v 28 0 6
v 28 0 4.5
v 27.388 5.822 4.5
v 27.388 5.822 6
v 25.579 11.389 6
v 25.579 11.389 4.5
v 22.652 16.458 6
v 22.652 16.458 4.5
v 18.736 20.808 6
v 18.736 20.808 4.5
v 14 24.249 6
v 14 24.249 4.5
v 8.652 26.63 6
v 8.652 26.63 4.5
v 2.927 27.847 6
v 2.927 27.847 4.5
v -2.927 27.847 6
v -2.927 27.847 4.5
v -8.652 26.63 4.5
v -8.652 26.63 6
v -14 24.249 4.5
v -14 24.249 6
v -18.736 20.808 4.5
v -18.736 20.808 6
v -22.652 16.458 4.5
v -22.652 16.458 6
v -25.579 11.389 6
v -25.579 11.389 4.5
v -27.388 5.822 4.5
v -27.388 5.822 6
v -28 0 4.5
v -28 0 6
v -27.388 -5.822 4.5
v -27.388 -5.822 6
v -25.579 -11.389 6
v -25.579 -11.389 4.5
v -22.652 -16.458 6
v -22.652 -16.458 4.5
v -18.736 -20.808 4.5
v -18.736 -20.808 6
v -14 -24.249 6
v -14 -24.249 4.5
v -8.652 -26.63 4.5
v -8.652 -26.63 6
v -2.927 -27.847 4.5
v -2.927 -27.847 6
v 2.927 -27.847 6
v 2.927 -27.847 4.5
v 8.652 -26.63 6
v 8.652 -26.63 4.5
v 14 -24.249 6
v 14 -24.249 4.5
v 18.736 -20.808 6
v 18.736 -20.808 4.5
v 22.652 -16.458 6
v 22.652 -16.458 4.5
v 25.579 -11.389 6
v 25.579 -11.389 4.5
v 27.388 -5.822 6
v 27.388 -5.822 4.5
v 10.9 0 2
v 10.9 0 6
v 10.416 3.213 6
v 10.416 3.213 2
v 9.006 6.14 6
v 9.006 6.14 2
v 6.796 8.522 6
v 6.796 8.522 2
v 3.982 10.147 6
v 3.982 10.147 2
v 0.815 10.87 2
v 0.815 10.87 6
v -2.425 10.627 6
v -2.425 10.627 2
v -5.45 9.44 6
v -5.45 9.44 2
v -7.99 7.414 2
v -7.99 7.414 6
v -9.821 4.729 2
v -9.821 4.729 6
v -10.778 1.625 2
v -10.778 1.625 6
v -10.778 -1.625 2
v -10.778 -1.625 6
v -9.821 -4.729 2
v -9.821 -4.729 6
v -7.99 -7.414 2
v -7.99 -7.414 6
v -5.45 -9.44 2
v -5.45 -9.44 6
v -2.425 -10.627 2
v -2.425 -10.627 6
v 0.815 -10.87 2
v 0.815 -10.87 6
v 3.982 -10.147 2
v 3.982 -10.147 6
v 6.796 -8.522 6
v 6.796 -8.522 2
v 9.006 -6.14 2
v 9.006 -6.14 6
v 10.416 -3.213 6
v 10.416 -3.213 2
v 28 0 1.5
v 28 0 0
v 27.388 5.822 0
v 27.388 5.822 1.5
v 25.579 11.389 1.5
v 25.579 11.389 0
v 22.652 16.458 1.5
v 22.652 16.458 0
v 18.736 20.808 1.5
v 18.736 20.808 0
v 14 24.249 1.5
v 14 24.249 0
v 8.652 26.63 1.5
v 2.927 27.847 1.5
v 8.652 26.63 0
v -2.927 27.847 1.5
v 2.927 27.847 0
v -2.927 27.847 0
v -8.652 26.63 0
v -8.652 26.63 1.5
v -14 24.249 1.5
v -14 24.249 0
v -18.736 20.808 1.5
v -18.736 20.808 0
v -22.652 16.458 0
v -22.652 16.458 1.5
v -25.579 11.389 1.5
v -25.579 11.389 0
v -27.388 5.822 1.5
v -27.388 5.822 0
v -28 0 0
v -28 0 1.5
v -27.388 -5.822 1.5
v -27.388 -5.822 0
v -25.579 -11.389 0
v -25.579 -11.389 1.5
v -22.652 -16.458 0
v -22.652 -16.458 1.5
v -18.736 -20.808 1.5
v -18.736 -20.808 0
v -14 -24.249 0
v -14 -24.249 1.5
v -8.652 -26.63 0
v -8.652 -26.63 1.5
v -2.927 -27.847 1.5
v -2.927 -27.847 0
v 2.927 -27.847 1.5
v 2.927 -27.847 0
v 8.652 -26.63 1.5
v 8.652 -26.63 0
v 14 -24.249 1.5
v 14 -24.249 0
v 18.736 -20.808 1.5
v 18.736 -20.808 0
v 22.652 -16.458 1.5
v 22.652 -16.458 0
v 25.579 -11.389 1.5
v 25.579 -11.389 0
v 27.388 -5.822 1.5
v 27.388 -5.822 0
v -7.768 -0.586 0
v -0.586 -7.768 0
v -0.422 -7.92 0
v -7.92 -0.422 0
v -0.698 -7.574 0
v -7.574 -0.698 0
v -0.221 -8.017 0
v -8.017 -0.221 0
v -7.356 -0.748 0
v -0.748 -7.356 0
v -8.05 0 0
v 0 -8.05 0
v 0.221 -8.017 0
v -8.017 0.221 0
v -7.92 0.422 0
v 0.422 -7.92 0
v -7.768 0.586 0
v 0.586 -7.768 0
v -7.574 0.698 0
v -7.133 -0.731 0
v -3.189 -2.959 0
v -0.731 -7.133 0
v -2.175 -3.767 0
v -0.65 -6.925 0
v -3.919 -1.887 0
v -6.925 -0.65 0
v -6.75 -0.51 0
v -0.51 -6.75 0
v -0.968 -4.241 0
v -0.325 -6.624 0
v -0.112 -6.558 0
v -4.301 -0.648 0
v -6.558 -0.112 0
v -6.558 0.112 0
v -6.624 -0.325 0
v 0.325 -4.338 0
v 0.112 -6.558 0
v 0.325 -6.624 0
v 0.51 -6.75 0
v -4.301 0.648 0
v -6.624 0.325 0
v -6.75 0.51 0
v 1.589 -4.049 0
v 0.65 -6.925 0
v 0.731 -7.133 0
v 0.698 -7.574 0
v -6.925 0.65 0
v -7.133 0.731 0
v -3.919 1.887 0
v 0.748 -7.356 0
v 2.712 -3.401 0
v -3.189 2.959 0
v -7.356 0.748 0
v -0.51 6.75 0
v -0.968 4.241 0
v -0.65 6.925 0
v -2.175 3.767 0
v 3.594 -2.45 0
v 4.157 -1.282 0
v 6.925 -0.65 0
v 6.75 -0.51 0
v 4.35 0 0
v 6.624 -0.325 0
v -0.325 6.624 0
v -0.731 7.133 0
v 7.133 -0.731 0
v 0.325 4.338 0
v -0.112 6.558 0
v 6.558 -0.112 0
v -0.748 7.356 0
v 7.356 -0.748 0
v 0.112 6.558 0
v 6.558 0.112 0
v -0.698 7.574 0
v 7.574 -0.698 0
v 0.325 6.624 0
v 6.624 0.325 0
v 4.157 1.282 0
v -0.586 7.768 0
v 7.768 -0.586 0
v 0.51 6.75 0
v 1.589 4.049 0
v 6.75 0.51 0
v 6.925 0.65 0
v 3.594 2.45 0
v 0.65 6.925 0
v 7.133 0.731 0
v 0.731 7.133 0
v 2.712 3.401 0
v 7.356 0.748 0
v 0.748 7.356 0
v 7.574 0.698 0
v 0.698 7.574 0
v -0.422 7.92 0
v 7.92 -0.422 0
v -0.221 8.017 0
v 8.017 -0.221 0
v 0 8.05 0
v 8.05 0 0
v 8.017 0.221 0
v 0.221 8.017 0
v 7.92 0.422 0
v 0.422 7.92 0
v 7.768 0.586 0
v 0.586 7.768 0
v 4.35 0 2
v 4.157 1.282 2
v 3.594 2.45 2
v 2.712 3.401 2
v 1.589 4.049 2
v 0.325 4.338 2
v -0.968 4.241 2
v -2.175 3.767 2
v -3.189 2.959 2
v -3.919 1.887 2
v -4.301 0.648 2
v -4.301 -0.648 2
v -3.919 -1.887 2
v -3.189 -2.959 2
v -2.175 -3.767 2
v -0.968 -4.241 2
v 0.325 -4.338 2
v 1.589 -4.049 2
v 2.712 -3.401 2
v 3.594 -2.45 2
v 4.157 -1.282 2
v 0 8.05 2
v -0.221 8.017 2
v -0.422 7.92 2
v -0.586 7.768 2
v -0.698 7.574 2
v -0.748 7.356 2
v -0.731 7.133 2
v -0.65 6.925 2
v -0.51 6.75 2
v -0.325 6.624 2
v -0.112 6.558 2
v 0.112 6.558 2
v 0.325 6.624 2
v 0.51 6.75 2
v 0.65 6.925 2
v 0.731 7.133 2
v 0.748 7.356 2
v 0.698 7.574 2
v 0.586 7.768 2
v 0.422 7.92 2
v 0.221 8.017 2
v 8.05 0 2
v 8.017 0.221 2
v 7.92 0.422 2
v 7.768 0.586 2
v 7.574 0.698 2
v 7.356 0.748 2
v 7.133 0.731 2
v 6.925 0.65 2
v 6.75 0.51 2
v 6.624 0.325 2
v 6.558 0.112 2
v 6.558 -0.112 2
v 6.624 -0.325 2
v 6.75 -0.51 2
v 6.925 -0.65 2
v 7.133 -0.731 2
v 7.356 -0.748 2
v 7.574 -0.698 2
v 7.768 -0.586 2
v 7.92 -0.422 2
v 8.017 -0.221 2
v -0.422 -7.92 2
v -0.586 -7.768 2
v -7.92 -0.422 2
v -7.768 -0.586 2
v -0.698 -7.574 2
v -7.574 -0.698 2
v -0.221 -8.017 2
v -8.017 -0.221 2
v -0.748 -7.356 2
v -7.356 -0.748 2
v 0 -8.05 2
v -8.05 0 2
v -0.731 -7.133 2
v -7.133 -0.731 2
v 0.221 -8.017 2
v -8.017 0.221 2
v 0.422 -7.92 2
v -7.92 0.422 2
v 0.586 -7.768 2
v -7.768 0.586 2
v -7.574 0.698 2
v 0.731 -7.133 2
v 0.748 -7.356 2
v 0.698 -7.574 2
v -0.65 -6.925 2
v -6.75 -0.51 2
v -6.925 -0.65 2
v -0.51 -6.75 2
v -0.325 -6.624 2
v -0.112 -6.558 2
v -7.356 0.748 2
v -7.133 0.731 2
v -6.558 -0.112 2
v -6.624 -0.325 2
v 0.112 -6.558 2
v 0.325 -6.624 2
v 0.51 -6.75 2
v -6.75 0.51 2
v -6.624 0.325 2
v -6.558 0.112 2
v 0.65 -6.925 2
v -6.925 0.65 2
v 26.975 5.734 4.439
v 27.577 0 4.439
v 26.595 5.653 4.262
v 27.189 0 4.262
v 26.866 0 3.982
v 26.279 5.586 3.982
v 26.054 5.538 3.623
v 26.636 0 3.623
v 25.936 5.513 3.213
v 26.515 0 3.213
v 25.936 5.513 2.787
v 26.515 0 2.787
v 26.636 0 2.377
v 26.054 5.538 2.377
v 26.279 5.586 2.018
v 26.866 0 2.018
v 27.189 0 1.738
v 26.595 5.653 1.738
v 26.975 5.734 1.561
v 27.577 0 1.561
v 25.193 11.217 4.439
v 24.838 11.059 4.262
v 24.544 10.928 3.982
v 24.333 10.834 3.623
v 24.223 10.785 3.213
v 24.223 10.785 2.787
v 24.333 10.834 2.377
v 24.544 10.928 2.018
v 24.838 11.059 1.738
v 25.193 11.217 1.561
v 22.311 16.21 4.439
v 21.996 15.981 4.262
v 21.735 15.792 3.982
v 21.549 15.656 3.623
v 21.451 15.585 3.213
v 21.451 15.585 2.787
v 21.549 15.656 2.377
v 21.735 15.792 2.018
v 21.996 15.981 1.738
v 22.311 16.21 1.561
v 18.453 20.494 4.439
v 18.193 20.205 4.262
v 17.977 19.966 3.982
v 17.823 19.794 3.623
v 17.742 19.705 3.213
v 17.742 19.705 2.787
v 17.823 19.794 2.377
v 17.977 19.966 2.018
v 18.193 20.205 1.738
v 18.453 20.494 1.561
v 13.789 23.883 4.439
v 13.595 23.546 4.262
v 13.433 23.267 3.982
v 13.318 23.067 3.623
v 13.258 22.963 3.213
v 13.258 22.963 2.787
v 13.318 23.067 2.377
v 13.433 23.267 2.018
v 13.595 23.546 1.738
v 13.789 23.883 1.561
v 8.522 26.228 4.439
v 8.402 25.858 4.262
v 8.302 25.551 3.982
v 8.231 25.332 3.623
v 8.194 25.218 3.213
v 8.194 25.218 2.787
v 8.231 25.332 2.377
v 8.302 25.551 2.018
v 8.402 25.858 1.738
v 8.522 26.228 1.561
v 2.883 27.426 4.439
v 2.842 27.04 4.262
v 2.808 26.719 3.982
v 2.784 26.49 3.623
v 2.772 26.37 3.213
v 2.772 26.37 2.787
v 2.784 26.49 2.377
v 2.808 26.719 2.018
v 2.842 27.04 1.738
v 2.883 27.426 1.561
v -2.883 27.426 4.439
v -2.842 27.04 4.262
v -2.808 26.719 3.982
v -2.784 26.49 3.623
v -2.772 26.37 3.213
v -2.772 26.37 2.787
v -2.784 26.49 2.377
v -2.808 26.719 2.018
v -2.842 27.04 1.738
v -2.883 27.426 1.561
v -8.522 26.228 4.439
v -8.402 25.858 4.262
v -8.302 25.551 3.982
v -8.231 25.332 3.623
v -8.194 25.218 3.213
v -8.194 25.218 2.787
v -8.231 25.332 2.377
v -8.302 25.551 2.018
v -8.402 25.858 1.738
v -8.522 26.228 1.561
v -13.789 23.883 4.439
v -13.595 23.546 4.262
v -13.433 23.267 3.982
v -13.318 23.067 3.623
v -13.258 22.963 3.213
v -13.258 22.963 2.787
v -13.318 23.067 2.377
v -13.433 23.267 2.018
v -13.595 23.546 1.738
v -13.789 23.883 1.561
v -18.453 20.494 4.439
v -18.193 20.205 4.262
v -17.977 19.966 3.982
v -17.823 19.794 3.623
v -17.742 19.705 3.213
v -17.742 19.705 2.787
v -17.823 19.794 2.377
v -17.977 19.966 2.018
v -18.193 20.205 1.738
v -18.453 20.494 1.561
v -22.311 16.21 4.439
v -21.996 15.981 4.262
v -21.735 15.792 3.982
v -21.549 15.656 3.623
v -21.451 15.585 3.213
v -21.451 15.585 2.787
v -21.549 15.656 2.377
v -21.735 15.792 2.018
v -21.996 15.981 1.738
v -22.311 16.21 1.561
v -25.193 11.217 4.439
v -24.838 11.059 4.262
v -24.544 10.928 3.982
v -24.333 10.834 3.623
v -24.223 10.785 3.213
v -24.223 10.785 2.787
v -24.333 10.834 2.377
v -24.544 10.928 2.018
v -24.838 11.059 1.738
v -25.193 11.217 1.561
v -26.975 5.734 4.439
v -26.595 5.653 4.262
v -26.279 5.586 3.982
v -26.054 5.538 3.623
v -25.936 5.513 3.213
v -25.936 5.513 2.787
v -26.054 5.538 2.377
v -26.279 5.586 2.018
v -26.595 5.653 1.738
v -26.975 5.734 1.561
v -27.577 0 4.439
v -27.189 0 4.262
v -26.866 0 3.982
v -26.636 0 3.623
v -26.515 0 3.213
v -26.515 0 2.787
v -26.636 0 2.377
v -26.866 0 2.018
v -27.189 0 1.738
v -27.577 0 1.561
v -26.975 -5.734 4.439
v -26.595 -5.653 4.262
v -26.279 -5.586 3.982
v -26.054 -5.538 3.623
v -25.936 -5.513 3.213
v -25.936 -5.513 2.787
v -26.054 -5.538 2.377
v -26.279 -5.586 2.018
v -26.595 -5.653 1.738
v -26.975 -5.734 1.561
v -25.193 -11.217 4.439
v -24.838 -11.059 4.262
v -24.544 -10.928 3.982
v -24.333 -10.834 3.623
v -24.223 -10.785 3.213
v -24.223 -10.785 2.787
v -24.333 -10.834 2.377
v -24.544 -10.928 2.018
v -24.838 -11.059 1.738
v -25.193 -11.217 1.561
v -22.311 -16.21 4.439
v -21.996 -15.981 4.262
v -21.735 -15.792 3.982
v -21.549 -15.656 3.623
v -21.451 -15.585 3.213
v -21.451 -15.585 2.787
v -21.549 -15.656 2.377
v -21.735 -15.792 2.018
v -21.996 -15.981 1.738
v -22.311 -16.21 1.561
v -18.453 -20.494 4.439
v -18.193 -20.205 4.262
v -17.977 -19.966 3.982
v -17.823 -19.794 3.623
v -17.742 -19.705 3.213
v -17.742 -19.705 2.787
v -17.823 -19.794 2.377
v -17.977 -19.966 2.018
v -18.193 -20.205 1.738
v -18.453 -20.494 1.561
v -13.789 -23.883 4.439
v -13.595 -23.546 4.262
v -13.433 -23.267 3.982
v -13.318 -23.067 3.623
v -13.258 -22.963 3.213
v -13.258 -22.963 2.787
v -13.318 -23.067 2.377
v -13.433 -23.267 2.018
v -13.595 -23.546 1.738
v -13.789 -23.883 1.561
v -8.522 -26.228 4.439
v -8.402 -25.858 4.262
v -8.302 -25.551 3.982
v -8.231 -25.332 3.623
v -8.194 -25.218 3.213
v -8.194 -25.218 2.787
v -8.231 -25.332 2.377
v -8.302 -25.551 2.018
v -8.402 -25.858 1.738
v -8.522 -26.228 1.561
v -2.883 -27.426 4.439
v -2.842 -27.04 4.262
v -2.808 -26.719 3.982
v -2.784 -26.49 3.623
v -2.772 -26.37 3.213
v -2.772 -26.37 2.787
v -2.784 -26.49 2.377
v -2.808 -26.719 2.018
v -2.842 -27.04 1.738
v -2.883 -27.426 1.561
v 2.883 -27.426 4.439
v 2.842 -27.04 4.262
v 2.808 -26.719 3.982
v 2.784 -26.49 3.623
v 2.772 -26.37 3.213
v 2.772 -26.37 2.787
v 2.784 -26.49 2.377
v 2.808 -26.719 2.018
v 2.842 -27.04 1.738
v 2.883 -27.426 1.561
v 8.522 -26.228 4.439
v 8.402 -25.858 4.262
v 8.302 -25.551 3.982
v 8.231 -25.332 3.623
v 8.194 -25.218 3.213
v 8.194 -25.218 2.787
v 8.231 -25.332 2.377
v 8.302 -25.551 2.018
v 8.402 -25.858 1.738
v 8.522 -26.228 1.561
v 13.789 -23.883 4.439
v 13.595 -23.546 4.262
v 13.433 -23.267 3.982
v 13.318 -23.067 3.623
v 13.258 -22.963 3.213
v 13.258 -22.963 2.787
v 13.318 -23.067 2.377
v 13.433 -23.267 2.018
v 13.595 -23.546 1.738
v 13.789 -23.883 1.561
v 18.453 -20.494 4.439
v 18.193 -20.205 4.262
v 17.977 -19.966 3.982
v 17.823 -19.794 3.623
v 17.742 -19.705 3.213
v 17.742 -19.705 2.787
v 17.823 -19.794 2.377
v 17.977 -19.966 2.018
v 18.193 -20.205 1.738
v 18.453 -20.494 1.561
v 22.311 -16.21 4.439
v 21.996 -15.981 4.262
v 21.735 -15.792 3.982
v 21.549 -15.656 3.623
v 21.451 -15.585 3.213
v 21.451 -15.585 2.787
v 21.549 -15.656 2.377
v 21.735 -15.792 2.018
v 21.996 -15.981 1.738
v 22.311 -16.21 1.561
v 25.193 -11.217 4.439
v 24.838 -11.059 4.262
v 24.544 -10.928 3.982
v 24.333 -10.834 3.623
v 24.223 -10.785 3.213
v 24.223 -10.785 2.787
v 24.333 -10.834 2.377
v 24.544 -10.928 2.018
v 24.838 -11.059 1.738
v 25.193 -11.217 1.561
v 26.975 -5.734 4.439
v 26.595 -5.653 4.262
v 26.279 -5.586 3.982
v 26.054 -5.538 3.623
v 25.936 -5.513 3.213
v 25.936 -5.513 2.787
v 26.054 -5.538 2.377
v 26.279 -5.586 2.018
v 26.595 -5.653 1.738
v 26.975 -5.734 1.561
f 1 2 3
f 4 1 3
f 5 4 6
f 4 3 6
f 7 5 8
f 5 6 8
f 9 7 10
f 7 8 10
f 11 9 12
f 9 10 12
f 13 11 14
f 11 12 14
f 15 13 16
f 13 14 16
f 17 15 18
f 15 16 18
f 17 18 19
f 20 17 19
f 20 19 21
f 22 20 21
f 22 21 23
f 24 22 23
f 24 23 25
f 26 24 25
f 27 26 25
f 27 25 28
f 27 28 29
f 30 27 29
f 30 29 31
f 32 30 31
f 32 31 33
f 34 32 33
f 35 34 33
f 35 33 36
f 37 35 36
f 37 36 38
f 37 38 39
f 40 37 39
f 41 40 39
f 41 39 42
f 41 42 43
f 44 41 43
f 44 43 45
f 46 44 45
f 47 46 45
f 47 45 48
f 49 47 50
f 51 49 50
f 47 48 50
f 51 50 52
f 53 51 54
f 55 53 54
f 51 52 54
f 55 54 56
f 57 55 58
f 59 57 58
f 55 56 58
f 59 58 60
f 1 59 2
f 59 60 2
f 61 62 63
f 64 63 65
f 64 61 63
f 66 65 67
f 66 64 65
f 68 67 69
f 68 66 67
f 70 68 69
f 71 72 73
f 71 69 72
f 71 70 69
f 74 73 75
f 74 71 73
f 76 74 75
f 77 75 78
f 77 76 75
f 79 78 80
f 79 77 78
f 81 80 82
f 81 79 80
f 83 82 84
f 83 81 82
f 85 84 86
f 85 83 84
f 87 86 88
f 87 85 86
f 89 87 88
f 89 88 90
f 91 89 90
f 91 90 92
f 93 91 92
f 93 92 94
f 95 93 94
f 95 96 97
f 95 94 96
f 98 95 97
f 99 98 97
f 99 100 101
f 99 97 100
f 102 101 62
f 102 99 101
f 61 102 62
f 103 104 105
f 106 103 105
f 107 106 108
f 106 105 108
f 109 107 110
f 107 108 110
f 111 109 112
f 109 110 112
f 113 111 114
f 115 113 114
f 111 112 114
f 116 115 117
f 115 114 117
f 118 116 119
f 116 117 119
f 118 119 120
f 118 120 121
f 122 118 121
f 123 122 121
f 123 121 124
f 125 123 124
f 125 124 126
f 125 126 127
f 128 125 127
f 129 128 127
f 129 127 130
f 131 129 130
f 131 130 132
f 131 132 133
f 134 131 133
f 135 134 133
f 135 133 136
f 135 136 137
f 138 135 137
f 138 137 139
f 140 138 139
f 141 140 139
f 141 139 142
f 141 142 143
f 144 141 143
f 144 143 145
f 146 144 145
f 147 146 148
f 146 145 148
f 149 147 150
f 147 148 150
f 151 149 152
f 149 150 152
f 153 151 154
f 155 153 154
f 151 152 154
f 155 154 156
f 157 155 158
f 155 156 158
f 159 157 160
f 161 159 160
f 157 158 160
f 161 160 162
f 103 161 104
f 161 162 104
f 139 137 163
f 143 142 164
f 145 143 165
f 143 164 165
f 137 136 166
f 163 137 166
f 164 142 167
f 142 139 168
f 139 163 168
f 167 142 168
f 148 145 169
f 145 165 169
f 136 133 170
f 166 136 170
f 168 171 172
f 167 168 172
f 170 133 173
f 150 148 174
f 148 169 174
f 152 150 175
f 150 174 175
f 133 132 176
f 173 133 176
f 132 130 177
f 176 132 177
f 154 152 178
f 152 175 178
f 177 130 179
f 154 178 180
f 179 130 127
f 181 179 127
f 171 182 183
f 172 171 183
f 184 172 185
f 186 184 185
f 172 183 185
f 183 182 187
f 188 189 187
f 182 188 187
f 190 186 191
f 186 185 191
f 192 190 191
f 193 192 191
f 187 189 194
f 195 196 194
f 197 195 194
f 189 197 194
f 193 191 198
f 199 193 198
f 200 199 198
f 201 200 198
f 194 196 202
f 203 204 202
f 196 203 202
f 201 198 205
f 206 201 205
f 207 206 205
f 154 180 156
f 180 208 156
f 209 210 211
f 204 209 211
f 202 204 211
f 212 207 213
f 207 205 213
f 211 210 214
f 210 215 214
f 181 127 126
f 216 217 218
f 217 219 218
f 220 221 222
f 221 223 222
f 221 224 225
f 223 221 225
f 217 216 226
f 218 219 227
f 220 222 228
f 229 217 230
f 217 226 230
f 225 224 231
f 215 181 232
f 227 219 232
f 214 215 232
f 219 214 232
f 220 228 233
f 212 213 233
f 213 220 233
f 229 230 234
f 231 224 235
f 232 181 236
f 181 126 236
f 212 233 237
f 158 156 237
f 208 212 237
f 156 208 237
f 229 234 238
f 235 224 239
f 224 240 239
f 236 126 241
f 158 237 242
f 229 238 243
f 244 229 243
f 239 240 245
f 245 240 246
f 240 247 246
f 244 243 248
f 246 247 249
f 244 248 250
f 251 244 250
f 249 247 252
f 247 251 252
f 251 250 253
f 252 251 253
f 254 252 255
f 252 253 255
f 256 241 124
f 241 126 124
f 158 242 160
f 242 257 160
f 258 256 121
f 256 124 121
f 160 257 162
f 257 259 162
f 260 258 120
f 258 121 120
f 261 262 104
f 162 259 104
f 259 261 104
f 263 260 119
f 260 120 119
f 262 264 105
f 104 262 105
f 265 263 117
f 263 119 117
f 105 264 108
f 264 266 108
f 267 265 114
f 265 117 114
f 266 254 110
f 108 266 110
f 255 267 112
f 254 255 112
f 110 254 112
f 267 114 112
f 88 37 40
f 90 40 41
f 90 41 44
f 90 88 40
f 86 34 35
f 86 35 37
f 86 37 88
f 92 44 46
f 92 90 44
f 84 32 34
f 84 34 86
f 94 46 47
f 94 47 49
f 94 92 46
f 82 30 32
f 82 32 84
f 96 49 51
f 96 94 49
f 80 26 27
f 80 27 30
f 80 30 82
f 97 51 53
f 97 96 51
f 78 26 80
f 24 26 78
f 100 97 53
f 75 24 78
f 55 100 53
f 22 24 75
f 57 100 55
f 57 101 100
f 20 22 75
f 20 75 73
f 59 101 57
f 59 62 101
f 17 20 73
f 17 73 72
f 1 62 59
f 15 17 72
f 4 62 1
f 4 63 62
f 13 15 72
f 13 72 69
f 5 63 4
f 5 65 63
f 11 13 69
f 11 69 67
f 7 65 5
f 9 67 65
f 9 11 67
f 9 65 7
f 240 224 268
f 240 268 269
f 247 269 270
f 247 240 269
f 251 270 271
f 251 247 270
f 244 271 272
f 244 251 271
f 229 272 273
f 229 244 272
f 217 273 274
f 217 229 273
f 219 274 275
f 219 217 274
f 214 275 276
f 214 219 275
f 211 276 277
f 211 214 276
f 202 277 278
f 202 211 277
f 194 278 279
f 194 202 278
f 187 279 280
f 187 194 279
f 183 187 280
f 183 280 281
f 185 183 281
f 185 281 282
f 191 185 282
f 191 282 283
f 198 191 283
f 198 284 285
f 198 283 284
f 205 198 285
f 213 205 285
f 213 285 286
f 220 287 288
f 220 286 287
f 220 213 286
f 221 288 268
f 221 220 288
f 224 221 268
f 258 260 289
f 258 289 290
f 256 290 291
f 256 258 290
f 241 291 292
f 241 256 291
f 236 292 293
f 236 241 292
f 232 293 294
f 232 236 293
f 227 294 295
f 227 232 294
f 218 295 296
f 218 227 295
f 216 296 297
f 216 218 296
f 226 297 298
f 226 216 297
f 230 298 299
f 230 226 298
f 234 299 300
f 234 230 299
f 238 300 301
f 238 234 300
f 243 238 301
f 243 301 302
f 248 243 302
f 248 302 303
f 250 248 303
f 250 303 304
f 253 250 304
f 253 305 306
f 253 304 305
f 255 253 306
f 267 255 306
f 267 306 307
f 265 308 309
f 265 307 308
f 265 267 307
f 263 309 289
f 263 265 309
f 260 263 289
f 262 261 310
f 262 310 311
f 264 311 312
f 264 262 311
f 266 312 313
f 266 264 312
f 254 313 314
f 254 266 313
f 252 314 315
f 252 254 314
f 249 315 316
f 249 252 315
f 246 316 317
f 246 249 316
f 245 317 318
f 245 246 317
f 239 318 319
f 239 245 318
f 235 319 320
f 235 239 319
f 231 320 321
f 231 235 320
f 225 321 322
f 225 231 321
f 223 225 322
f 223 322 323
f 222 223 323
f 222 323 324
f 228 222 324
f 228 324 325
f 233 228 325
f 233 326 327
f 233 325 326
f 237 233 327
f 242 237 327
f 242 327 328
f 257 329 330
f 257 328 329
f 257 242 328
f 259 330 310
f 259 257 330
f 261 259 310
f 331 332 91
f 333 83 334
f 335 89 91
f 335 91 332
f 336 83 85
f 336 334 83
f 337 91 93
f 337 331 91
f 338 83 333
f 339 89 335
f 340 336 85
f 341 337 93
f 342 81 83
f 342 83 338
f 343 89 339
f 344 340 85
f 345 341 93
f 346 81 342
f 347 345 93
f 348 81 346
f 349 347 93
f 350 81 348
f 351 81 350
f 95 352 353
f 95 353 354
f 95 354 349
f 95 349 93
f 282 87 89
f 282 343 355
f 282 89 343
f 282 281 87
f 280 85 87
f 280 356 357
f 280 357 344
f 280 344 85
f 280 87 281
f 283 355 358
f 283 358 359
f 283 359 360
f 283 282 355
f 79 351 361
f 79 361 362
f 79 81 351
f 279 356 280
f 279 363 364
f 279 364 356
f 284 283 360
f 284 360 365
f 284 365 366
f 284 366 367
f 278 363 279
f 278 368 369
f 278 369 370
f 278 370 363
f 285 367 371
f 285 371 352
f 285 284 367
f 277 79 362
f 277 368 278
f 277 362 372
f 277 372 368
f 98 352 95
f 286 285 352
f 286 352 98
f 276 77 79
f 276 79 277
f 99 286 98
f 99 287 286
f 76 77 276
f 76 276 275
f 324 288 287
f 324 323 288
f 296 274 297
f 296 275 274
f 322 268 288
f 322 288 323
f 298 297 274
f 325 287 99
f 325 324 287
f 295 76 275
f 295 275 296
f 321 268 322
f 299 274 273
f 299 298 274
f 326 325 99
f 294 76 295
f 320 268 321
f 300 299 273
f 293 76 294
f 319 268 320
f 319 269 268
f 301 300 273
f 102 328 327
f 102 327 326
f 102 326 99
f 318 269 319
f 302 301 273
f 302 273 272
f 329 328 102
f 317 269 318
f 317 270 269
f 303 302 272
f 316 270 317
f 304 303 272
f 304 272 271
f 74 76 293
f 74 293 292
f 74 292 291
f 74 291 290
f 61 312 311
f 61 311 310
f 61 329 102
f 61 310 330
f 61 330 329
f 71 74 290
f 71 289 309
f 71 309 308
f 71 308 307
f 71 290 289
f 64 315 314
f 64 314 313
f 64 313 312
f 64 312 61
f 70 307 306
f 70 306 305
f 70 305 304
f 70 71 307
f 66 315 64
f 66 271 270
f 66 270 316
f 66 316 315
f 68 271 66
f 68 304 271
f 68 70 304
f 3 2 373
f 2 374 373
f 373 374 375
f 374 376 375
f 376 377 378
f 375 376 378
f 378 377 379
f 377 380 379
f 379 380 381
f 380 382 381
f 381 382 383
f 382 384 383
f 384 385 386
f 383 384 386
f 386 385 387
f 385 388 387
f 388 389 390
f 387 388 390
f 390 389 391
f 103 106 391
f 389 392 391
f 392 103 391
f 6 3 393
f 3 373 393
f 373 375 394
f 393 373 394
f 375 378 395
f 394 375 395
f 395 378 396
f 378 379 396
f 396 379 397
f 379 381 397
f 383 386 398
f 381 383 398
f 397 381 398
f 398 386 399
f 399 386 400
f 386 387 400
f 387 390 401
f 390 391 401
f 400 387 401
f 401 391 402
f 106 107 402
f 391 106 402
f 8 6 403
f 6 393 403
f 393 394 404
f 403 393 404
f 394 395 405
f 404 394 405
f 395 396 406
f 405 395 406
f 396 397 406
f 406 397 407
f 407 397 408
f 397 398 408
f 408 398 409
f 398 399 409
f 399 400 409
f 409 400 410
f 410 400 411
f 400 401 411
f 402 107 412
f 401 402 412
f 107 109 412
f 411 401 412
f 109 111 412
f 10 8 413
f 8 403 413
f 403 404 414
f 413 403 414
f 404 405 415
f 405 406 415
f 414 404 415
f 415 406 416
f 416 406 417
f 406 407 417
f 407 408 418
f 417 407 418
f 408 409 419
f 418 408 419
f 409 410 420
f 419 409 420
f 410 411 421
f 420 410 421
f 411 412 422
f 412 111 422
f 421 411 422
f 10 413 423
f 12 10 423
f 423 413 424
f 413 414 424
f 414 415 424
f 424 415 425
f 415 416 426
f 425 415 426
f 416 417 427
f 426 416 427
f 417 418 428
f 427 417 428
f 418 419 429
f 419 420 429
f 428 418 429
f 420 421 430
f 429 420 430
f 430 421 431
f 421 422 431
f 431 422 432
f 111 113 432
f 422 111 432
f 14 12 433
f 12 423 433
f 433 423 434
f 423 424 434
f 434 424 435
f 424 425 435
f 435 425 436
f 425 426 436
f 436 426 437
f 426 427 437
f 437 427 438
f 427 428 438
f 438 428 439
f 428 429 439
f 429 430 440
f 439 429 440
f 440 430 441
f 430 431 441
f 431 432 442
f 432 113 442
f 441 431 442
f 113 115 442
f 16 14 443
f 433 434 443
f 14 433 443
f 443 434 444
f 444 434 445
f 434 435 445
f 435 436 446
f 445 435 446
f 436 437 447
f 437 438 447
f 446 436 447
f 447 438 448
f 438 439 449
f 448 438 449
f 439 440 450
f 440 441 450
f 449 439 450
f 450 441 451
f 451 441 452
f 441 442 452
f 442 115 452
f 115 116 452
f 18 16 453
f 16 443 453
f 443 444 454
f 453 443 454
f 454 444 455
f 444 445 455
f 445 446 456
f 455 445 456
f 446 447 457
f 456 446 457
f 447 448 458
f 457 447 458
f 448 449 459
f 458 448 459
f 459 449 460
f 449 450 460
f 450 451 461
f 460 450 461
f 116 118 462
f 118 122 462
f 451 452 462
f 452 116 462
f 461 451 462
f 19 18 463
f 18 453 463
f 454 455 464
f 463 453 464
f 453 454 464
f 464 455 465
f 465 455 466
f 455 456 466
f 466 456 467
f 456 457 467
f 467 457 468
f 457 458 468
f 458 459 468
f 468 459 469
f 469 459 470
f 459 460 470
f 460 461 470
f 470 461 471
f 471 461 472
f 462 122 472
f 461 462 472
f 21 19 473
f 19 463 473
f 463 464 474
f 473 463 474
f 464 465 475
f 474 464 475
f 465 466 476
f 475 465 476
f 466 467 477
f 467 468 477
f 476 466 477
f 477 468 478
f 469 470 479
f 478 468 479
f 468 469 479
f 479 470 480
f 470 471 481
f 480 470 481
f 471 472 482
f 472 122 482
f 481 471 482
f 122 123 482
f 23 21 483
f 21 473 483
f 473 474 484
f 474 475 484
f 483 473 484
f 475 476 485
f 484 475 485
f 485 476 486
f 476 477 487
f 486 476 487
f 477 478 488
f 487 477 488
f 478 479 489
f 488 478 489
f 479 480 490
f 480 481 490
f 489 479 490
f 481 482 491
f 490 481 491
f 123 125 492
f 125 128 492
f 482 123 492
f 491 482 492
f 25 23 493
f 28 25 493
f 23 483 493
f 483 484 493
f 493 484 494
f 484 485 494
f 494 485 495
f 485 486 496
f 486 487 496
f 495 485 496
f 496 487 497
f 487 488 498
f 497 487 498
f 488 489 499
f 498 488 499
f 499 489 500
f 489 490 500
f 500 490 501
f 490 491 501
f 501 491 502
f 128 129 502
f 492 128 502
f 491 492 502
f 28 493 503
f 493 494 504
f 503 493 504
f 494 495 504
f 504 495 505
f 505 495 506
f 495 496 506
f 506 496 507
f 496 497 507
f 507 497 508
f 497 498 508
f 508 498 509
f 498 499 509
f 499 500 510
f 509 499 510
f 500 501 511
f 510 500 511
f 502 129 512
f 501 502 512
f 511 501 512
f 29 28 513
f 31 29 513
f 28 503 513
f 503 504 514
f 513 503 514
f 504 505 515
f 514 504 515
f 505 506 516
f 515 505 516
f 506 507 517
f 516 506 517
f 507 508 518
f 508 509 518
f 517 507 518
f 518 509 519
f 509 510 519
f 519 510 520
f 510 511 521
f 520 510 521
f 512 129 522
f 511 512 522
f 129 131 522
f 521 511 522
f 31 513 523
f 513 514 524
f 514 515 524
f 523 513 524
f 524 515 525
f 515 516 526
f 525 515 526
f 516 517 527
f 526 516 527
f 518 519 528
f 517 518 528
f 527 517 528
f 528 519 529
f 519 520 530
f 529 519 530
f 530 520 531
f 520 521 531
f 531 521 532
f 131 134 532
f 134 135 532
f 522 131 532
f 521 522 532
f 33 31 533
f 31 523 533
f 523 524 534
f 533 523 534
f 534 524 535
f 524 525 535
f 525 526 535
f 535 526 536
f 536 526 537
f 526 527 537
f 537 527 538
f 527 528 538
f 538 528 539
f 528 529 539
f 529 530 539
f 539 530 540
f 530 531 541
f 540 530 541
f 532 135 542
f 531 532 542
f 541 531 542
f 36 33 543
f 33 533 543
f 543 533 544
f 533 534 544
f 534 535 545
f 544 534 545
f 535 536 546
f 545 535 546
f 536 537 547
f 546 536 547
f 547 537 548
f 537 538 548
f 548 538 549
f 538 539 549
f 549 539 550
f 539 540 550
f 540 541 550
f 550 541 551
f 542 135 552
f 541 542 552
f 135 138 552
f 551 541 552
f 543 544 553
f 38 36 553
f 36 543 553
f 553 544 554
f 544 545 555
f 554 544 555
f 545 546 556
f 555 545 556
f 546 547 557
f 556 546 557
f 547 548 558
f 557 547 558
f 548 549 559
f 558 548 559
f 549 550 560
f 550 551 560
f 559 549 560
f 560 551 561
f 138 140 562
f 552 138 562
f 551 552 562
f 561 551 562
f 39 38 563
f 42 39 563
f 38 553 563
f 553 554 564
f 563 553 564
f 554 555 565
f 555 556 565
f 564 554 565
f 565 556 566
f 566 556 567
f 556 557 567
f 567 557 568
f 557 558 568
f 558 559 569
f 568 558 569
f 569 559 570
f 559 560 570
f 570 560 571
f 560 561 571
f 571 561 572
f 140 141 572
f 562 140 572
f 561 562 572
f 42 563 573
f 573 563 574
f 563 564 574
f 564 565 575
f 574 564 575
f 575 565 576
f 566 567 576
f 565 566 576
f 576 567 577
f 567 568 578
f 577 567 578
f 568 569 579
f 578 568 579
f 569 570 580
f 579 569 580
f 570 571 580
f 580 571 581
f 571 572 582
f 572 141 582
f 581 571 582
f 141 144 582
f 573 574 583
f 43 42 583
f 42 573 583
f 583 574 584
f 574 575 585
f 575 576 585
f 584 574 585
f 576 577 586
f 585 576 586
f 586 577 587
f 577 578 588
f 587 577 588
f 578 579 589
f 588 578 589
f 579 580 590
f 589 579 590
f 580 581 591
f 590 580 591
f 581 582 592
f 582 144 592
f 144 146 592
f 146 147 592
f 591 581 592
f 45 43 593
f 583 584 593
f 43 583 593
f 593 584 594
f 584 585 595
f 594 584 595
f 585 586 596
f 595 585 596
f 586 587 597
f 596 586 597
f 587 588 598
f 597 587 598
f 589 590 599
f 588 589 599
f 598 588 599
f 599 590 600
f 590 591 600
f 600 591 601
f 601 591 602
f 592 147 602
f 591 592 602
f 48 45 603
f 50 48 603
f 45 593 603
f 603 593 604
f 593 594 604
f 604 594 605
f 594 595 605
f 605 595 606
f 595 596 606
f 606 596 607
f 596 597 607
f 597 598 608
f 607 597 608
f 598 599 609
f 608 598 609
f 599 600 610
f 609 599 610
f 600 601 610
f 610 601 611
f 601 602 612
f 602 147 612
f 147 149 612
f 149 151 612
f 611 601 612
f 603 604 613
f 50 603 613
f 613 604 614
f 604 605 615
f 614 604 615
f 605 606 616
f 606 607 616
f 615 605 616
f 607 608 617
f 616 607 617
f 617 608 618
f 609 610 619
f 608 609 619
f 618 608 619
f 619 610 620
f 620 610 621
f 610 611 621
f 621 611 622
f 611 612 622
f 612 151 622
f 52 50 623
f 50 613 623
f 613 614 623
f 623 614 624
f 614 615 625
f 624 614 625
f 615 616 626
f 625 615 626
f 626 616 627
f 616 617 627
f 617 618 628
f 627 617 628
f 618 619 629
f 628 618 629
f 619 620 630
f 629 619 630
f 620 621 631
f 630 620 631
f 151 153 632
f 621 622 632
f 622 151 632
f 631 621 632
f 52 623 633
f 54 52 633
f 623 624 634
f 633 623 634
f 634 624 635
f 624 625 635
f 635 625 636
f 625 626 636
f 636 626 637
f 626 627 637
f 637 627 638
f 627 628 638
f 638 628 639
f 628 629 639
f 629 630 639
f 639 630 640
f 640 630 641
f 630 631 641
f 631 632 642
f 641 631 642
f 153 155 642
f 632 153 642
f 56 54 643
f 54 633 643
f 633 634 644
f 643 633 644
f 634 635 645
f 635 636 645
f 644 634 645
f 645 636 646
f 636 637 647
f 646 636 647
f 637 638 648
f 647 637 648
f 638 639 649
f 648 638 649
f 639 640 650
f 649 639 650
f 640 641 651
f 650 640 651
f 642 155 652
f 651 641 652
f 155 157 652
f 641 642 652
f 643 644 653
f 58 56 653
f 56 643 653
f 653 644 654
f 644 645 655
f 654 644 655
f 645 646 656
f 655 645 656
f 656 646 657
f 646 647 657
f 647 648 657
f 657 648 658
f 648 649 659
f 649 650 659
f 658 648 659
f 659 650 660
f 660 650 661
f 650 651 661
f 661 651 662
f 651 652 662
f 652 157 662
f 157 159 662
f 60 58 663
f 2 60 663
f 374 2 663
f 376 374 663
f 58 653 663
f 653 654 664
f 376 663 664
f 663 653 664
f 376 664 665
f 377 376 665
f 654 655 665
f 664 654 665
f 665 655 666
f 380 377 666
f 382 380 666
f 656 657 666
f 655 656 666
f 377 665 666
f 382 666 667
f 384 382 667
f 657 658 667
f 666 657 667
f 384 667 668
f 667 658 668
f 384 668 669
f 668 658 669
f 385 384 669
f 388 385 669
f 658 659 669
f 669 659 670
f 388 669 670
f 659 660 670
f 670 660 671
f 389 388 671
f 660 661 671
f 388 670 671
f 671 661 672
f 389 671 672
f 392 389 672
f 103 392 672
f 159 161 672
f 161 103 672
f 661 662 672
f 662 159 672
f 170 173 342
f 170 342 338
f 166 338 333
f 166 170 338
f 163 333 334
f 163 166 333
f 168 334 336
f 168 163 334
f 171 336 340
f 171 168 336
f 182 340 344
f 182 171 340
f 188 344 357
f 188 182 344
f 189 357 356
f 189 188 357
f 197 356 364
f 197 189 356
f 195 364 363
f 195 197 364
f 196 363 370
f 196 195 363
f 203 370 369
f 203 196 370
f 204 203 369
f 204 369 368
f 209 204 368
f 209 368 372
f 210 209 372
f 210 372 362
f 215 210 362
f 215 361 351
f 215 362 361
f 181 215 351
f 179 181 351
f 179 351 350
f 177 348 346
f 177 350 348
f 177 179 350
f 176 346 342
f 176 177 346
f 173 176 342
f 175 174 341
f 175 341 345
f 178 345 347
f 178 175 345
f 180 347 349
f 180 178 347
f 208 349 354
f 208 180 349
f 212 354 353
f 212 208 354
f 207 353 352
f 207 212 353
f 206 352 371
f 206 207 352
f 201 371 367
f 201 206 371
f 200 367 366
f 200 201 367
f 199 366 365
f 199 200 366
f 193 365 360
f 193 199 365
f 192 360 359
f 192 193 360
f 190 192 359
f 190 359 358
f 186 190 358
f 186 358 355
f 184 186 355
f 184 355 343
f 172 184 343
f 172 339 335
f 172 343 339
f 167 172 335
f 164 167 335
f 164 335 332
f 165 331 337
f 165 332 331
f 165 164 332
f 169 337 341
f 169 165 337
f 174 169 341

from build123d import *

# Parameters (mm, degrees)
CYLINDER003_R     = 0.75
CYLINDER003_DEPTH = 10
ARRAY_COUNT       = 4
CYLINDER002_R     = 4.35
CYLINDER002_DEPTH = 10
CYLINDER001_R     = 10.9
CYLINDER001_DEPTH = 10
TORUS_R           = 1.5
CYLINDER_R        = 28
CYLINDER_DEPTH    = 6


with BuildPart() as array:
    # Cylinder003 → Cylinder003 (new body)
    with BuildSketch(Plane(origin=(7.3, 0, -2), x_dir=(1, 0, 0), z_dir=(0, 0, 1))):
        Circle(CYLINDER003_R)
    extrude(amount=CYLINDER003_DEPTH)

    # Array: Array ×4 about axis
    array_axis = Axis((0, 0, 0), (0, 0, 1))


with BuildPart() as array_1:
    add(array.part)
    for i in range(1, ARRAY_COUNT):
        add(array.part.rotate(array_axis, i * 360 / ARRAY_COUNT))


with BuildPart() as hueco_eje:
    # Cylinder002 → Cylinder002 (new body)
    with BuildSketch(Plane.XY.offset(-2)):
        Circle(CYLINDER002_R)
    extrude(amount=CYLINDER002_DEPTH)


with BuildPart() as corona_servo:
    # Cylinder001 → Cylinder001 (new body)
    with BuildSketch(Plane.XY.offset(2)):
        Circle(CYLINDER001_R)
    extrude(amount=CYLINDER001_DEPTH)


with BuildPart() as vaciaod_junta_torica:
    # Torus → Torus (revolve)
    with BuildSketch(Plane(origin=(0, 0, 3), x_dir=(1, 0, 0), z_dir=(0, -1, 0))):
        with Locations((28, 0)):
            Circle(TORUS_R)
    revolve(axis=Axis((0, 0, 3), (0, 0, 1)))


with BuildPart() as rueda_miniskybot:
    # Cylinder → Cylinder (new body)
    with BuildSketch(Plane.XY):
        Circle(CYLINDER_R)
    extrude(amount=CYLINDER_DEPTH)

    # Cut: cut Vaciaod_junta_torica
    add(vaciaod_junta_torica.part, mode=Mode.SUBTRACT)

    # Cut001: cut Corona_servo
    add(corona_servo.part, mode=Mode.SUBTRACT)

    # Cut002: cut Hueco_eje
    add(hueco_eje.part, mode=Mode.SUBTRACT)

    # Cut003: cut Array
    add(array_1.part, mode=Mode.SUBTRACT)


solid = rueda_miniskybot.part
